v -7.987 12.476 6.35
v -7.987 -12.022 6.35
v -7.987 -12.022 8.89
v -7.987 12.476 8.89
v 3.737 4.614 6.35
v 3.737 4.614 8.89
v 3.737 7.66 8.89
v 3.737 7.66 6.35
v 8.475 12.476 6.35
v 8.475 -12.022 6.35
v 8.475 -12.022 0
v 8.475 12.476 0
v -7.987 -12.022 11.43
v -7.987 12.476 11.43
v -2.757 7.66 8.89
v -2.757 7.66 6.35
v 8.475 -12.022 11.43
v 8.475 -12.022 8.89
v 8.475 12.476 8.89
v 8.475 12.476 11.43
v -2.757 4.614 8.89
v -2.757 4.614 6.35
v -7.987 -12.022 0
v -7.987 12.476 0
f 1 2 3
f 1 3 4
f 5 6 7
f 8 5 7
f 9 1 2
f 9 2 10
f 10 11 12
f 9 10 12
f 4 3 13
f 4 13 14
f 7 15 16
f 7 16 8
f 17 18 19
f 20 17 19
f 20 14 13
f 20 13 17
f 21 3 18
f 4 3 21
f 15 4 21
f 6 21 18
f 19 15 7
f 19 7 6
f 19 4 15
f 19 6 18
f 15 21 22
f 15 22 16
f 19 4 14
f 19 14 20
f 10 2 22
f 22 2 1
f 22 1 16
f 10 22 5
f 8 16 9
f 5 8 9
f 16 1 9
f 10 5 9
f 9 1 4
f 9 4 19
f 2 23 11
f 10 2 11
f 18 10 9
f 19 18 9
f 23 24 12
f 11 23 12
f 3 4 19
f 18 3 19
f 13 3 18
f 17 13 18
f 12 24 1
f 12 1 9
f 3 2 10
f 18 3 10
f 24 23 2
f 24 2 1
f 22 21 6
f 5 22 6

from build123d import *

# Parameters (mm, degrees)
F0_W     = 16.462284606
F0_H     = 24.4974466041
F1_DEPTH = 6.35
F2_W     = 16.462284606
F2_H     = 24.4974466041
F3_DEPTH = 2.54
F4_W     = 6.493705092
F4_H     = 3.0464301817
F5_DEPTH = 2.54
F6_W     = 16.462284606
F6_H     = 24.4974466041
F7_DEPTH = 2.54


# Not quite as in the source:
# - a feature names something its author has since deleted; it is built from what else it names


with BuildPart() as f1:
    # F0 (on Top) → F1 (new body)
    with BuildSketch(Plane.XY):
        with Locations((0.2442786936, 0.227171462)):
            Rectangle(F0_W, F0_H)
    extrude(amount=F1_DEPTH)


with BuildPart() as f3:
    # F2 (on face) → F3 (new body)
    with BuildSketch(Plane.XY.offset(6.35)):
        with Locations((0.2442786936, 0.227171462)):
            Rectangle(F2_W, F2_H)
    extrude(amount=F3_DEPTH)

    # F4 (on face) → F5 (cut)
    with BuildSketch(Plane.XY.offset(8.89)):
        with Locations((0.4903447116, 6.1370439362)):
            Rectangle(F4_W, F4_H)
    extrude(amount=-F5_DEPTH, mode=Mode.SUBTRACT)


with BuildPart() as f7:
    # F6 (on face) → F7 (new body)
    with BuildSketch(Plane.XY.offset(8.89)):
        with Locations((0.2442786936, 0.227171462)):
            Rectangle(F6_W, F6_H)
    extrude(amount=F7_DEPTH)


solid = Compound([f1.part, f3.part, f7.part])
